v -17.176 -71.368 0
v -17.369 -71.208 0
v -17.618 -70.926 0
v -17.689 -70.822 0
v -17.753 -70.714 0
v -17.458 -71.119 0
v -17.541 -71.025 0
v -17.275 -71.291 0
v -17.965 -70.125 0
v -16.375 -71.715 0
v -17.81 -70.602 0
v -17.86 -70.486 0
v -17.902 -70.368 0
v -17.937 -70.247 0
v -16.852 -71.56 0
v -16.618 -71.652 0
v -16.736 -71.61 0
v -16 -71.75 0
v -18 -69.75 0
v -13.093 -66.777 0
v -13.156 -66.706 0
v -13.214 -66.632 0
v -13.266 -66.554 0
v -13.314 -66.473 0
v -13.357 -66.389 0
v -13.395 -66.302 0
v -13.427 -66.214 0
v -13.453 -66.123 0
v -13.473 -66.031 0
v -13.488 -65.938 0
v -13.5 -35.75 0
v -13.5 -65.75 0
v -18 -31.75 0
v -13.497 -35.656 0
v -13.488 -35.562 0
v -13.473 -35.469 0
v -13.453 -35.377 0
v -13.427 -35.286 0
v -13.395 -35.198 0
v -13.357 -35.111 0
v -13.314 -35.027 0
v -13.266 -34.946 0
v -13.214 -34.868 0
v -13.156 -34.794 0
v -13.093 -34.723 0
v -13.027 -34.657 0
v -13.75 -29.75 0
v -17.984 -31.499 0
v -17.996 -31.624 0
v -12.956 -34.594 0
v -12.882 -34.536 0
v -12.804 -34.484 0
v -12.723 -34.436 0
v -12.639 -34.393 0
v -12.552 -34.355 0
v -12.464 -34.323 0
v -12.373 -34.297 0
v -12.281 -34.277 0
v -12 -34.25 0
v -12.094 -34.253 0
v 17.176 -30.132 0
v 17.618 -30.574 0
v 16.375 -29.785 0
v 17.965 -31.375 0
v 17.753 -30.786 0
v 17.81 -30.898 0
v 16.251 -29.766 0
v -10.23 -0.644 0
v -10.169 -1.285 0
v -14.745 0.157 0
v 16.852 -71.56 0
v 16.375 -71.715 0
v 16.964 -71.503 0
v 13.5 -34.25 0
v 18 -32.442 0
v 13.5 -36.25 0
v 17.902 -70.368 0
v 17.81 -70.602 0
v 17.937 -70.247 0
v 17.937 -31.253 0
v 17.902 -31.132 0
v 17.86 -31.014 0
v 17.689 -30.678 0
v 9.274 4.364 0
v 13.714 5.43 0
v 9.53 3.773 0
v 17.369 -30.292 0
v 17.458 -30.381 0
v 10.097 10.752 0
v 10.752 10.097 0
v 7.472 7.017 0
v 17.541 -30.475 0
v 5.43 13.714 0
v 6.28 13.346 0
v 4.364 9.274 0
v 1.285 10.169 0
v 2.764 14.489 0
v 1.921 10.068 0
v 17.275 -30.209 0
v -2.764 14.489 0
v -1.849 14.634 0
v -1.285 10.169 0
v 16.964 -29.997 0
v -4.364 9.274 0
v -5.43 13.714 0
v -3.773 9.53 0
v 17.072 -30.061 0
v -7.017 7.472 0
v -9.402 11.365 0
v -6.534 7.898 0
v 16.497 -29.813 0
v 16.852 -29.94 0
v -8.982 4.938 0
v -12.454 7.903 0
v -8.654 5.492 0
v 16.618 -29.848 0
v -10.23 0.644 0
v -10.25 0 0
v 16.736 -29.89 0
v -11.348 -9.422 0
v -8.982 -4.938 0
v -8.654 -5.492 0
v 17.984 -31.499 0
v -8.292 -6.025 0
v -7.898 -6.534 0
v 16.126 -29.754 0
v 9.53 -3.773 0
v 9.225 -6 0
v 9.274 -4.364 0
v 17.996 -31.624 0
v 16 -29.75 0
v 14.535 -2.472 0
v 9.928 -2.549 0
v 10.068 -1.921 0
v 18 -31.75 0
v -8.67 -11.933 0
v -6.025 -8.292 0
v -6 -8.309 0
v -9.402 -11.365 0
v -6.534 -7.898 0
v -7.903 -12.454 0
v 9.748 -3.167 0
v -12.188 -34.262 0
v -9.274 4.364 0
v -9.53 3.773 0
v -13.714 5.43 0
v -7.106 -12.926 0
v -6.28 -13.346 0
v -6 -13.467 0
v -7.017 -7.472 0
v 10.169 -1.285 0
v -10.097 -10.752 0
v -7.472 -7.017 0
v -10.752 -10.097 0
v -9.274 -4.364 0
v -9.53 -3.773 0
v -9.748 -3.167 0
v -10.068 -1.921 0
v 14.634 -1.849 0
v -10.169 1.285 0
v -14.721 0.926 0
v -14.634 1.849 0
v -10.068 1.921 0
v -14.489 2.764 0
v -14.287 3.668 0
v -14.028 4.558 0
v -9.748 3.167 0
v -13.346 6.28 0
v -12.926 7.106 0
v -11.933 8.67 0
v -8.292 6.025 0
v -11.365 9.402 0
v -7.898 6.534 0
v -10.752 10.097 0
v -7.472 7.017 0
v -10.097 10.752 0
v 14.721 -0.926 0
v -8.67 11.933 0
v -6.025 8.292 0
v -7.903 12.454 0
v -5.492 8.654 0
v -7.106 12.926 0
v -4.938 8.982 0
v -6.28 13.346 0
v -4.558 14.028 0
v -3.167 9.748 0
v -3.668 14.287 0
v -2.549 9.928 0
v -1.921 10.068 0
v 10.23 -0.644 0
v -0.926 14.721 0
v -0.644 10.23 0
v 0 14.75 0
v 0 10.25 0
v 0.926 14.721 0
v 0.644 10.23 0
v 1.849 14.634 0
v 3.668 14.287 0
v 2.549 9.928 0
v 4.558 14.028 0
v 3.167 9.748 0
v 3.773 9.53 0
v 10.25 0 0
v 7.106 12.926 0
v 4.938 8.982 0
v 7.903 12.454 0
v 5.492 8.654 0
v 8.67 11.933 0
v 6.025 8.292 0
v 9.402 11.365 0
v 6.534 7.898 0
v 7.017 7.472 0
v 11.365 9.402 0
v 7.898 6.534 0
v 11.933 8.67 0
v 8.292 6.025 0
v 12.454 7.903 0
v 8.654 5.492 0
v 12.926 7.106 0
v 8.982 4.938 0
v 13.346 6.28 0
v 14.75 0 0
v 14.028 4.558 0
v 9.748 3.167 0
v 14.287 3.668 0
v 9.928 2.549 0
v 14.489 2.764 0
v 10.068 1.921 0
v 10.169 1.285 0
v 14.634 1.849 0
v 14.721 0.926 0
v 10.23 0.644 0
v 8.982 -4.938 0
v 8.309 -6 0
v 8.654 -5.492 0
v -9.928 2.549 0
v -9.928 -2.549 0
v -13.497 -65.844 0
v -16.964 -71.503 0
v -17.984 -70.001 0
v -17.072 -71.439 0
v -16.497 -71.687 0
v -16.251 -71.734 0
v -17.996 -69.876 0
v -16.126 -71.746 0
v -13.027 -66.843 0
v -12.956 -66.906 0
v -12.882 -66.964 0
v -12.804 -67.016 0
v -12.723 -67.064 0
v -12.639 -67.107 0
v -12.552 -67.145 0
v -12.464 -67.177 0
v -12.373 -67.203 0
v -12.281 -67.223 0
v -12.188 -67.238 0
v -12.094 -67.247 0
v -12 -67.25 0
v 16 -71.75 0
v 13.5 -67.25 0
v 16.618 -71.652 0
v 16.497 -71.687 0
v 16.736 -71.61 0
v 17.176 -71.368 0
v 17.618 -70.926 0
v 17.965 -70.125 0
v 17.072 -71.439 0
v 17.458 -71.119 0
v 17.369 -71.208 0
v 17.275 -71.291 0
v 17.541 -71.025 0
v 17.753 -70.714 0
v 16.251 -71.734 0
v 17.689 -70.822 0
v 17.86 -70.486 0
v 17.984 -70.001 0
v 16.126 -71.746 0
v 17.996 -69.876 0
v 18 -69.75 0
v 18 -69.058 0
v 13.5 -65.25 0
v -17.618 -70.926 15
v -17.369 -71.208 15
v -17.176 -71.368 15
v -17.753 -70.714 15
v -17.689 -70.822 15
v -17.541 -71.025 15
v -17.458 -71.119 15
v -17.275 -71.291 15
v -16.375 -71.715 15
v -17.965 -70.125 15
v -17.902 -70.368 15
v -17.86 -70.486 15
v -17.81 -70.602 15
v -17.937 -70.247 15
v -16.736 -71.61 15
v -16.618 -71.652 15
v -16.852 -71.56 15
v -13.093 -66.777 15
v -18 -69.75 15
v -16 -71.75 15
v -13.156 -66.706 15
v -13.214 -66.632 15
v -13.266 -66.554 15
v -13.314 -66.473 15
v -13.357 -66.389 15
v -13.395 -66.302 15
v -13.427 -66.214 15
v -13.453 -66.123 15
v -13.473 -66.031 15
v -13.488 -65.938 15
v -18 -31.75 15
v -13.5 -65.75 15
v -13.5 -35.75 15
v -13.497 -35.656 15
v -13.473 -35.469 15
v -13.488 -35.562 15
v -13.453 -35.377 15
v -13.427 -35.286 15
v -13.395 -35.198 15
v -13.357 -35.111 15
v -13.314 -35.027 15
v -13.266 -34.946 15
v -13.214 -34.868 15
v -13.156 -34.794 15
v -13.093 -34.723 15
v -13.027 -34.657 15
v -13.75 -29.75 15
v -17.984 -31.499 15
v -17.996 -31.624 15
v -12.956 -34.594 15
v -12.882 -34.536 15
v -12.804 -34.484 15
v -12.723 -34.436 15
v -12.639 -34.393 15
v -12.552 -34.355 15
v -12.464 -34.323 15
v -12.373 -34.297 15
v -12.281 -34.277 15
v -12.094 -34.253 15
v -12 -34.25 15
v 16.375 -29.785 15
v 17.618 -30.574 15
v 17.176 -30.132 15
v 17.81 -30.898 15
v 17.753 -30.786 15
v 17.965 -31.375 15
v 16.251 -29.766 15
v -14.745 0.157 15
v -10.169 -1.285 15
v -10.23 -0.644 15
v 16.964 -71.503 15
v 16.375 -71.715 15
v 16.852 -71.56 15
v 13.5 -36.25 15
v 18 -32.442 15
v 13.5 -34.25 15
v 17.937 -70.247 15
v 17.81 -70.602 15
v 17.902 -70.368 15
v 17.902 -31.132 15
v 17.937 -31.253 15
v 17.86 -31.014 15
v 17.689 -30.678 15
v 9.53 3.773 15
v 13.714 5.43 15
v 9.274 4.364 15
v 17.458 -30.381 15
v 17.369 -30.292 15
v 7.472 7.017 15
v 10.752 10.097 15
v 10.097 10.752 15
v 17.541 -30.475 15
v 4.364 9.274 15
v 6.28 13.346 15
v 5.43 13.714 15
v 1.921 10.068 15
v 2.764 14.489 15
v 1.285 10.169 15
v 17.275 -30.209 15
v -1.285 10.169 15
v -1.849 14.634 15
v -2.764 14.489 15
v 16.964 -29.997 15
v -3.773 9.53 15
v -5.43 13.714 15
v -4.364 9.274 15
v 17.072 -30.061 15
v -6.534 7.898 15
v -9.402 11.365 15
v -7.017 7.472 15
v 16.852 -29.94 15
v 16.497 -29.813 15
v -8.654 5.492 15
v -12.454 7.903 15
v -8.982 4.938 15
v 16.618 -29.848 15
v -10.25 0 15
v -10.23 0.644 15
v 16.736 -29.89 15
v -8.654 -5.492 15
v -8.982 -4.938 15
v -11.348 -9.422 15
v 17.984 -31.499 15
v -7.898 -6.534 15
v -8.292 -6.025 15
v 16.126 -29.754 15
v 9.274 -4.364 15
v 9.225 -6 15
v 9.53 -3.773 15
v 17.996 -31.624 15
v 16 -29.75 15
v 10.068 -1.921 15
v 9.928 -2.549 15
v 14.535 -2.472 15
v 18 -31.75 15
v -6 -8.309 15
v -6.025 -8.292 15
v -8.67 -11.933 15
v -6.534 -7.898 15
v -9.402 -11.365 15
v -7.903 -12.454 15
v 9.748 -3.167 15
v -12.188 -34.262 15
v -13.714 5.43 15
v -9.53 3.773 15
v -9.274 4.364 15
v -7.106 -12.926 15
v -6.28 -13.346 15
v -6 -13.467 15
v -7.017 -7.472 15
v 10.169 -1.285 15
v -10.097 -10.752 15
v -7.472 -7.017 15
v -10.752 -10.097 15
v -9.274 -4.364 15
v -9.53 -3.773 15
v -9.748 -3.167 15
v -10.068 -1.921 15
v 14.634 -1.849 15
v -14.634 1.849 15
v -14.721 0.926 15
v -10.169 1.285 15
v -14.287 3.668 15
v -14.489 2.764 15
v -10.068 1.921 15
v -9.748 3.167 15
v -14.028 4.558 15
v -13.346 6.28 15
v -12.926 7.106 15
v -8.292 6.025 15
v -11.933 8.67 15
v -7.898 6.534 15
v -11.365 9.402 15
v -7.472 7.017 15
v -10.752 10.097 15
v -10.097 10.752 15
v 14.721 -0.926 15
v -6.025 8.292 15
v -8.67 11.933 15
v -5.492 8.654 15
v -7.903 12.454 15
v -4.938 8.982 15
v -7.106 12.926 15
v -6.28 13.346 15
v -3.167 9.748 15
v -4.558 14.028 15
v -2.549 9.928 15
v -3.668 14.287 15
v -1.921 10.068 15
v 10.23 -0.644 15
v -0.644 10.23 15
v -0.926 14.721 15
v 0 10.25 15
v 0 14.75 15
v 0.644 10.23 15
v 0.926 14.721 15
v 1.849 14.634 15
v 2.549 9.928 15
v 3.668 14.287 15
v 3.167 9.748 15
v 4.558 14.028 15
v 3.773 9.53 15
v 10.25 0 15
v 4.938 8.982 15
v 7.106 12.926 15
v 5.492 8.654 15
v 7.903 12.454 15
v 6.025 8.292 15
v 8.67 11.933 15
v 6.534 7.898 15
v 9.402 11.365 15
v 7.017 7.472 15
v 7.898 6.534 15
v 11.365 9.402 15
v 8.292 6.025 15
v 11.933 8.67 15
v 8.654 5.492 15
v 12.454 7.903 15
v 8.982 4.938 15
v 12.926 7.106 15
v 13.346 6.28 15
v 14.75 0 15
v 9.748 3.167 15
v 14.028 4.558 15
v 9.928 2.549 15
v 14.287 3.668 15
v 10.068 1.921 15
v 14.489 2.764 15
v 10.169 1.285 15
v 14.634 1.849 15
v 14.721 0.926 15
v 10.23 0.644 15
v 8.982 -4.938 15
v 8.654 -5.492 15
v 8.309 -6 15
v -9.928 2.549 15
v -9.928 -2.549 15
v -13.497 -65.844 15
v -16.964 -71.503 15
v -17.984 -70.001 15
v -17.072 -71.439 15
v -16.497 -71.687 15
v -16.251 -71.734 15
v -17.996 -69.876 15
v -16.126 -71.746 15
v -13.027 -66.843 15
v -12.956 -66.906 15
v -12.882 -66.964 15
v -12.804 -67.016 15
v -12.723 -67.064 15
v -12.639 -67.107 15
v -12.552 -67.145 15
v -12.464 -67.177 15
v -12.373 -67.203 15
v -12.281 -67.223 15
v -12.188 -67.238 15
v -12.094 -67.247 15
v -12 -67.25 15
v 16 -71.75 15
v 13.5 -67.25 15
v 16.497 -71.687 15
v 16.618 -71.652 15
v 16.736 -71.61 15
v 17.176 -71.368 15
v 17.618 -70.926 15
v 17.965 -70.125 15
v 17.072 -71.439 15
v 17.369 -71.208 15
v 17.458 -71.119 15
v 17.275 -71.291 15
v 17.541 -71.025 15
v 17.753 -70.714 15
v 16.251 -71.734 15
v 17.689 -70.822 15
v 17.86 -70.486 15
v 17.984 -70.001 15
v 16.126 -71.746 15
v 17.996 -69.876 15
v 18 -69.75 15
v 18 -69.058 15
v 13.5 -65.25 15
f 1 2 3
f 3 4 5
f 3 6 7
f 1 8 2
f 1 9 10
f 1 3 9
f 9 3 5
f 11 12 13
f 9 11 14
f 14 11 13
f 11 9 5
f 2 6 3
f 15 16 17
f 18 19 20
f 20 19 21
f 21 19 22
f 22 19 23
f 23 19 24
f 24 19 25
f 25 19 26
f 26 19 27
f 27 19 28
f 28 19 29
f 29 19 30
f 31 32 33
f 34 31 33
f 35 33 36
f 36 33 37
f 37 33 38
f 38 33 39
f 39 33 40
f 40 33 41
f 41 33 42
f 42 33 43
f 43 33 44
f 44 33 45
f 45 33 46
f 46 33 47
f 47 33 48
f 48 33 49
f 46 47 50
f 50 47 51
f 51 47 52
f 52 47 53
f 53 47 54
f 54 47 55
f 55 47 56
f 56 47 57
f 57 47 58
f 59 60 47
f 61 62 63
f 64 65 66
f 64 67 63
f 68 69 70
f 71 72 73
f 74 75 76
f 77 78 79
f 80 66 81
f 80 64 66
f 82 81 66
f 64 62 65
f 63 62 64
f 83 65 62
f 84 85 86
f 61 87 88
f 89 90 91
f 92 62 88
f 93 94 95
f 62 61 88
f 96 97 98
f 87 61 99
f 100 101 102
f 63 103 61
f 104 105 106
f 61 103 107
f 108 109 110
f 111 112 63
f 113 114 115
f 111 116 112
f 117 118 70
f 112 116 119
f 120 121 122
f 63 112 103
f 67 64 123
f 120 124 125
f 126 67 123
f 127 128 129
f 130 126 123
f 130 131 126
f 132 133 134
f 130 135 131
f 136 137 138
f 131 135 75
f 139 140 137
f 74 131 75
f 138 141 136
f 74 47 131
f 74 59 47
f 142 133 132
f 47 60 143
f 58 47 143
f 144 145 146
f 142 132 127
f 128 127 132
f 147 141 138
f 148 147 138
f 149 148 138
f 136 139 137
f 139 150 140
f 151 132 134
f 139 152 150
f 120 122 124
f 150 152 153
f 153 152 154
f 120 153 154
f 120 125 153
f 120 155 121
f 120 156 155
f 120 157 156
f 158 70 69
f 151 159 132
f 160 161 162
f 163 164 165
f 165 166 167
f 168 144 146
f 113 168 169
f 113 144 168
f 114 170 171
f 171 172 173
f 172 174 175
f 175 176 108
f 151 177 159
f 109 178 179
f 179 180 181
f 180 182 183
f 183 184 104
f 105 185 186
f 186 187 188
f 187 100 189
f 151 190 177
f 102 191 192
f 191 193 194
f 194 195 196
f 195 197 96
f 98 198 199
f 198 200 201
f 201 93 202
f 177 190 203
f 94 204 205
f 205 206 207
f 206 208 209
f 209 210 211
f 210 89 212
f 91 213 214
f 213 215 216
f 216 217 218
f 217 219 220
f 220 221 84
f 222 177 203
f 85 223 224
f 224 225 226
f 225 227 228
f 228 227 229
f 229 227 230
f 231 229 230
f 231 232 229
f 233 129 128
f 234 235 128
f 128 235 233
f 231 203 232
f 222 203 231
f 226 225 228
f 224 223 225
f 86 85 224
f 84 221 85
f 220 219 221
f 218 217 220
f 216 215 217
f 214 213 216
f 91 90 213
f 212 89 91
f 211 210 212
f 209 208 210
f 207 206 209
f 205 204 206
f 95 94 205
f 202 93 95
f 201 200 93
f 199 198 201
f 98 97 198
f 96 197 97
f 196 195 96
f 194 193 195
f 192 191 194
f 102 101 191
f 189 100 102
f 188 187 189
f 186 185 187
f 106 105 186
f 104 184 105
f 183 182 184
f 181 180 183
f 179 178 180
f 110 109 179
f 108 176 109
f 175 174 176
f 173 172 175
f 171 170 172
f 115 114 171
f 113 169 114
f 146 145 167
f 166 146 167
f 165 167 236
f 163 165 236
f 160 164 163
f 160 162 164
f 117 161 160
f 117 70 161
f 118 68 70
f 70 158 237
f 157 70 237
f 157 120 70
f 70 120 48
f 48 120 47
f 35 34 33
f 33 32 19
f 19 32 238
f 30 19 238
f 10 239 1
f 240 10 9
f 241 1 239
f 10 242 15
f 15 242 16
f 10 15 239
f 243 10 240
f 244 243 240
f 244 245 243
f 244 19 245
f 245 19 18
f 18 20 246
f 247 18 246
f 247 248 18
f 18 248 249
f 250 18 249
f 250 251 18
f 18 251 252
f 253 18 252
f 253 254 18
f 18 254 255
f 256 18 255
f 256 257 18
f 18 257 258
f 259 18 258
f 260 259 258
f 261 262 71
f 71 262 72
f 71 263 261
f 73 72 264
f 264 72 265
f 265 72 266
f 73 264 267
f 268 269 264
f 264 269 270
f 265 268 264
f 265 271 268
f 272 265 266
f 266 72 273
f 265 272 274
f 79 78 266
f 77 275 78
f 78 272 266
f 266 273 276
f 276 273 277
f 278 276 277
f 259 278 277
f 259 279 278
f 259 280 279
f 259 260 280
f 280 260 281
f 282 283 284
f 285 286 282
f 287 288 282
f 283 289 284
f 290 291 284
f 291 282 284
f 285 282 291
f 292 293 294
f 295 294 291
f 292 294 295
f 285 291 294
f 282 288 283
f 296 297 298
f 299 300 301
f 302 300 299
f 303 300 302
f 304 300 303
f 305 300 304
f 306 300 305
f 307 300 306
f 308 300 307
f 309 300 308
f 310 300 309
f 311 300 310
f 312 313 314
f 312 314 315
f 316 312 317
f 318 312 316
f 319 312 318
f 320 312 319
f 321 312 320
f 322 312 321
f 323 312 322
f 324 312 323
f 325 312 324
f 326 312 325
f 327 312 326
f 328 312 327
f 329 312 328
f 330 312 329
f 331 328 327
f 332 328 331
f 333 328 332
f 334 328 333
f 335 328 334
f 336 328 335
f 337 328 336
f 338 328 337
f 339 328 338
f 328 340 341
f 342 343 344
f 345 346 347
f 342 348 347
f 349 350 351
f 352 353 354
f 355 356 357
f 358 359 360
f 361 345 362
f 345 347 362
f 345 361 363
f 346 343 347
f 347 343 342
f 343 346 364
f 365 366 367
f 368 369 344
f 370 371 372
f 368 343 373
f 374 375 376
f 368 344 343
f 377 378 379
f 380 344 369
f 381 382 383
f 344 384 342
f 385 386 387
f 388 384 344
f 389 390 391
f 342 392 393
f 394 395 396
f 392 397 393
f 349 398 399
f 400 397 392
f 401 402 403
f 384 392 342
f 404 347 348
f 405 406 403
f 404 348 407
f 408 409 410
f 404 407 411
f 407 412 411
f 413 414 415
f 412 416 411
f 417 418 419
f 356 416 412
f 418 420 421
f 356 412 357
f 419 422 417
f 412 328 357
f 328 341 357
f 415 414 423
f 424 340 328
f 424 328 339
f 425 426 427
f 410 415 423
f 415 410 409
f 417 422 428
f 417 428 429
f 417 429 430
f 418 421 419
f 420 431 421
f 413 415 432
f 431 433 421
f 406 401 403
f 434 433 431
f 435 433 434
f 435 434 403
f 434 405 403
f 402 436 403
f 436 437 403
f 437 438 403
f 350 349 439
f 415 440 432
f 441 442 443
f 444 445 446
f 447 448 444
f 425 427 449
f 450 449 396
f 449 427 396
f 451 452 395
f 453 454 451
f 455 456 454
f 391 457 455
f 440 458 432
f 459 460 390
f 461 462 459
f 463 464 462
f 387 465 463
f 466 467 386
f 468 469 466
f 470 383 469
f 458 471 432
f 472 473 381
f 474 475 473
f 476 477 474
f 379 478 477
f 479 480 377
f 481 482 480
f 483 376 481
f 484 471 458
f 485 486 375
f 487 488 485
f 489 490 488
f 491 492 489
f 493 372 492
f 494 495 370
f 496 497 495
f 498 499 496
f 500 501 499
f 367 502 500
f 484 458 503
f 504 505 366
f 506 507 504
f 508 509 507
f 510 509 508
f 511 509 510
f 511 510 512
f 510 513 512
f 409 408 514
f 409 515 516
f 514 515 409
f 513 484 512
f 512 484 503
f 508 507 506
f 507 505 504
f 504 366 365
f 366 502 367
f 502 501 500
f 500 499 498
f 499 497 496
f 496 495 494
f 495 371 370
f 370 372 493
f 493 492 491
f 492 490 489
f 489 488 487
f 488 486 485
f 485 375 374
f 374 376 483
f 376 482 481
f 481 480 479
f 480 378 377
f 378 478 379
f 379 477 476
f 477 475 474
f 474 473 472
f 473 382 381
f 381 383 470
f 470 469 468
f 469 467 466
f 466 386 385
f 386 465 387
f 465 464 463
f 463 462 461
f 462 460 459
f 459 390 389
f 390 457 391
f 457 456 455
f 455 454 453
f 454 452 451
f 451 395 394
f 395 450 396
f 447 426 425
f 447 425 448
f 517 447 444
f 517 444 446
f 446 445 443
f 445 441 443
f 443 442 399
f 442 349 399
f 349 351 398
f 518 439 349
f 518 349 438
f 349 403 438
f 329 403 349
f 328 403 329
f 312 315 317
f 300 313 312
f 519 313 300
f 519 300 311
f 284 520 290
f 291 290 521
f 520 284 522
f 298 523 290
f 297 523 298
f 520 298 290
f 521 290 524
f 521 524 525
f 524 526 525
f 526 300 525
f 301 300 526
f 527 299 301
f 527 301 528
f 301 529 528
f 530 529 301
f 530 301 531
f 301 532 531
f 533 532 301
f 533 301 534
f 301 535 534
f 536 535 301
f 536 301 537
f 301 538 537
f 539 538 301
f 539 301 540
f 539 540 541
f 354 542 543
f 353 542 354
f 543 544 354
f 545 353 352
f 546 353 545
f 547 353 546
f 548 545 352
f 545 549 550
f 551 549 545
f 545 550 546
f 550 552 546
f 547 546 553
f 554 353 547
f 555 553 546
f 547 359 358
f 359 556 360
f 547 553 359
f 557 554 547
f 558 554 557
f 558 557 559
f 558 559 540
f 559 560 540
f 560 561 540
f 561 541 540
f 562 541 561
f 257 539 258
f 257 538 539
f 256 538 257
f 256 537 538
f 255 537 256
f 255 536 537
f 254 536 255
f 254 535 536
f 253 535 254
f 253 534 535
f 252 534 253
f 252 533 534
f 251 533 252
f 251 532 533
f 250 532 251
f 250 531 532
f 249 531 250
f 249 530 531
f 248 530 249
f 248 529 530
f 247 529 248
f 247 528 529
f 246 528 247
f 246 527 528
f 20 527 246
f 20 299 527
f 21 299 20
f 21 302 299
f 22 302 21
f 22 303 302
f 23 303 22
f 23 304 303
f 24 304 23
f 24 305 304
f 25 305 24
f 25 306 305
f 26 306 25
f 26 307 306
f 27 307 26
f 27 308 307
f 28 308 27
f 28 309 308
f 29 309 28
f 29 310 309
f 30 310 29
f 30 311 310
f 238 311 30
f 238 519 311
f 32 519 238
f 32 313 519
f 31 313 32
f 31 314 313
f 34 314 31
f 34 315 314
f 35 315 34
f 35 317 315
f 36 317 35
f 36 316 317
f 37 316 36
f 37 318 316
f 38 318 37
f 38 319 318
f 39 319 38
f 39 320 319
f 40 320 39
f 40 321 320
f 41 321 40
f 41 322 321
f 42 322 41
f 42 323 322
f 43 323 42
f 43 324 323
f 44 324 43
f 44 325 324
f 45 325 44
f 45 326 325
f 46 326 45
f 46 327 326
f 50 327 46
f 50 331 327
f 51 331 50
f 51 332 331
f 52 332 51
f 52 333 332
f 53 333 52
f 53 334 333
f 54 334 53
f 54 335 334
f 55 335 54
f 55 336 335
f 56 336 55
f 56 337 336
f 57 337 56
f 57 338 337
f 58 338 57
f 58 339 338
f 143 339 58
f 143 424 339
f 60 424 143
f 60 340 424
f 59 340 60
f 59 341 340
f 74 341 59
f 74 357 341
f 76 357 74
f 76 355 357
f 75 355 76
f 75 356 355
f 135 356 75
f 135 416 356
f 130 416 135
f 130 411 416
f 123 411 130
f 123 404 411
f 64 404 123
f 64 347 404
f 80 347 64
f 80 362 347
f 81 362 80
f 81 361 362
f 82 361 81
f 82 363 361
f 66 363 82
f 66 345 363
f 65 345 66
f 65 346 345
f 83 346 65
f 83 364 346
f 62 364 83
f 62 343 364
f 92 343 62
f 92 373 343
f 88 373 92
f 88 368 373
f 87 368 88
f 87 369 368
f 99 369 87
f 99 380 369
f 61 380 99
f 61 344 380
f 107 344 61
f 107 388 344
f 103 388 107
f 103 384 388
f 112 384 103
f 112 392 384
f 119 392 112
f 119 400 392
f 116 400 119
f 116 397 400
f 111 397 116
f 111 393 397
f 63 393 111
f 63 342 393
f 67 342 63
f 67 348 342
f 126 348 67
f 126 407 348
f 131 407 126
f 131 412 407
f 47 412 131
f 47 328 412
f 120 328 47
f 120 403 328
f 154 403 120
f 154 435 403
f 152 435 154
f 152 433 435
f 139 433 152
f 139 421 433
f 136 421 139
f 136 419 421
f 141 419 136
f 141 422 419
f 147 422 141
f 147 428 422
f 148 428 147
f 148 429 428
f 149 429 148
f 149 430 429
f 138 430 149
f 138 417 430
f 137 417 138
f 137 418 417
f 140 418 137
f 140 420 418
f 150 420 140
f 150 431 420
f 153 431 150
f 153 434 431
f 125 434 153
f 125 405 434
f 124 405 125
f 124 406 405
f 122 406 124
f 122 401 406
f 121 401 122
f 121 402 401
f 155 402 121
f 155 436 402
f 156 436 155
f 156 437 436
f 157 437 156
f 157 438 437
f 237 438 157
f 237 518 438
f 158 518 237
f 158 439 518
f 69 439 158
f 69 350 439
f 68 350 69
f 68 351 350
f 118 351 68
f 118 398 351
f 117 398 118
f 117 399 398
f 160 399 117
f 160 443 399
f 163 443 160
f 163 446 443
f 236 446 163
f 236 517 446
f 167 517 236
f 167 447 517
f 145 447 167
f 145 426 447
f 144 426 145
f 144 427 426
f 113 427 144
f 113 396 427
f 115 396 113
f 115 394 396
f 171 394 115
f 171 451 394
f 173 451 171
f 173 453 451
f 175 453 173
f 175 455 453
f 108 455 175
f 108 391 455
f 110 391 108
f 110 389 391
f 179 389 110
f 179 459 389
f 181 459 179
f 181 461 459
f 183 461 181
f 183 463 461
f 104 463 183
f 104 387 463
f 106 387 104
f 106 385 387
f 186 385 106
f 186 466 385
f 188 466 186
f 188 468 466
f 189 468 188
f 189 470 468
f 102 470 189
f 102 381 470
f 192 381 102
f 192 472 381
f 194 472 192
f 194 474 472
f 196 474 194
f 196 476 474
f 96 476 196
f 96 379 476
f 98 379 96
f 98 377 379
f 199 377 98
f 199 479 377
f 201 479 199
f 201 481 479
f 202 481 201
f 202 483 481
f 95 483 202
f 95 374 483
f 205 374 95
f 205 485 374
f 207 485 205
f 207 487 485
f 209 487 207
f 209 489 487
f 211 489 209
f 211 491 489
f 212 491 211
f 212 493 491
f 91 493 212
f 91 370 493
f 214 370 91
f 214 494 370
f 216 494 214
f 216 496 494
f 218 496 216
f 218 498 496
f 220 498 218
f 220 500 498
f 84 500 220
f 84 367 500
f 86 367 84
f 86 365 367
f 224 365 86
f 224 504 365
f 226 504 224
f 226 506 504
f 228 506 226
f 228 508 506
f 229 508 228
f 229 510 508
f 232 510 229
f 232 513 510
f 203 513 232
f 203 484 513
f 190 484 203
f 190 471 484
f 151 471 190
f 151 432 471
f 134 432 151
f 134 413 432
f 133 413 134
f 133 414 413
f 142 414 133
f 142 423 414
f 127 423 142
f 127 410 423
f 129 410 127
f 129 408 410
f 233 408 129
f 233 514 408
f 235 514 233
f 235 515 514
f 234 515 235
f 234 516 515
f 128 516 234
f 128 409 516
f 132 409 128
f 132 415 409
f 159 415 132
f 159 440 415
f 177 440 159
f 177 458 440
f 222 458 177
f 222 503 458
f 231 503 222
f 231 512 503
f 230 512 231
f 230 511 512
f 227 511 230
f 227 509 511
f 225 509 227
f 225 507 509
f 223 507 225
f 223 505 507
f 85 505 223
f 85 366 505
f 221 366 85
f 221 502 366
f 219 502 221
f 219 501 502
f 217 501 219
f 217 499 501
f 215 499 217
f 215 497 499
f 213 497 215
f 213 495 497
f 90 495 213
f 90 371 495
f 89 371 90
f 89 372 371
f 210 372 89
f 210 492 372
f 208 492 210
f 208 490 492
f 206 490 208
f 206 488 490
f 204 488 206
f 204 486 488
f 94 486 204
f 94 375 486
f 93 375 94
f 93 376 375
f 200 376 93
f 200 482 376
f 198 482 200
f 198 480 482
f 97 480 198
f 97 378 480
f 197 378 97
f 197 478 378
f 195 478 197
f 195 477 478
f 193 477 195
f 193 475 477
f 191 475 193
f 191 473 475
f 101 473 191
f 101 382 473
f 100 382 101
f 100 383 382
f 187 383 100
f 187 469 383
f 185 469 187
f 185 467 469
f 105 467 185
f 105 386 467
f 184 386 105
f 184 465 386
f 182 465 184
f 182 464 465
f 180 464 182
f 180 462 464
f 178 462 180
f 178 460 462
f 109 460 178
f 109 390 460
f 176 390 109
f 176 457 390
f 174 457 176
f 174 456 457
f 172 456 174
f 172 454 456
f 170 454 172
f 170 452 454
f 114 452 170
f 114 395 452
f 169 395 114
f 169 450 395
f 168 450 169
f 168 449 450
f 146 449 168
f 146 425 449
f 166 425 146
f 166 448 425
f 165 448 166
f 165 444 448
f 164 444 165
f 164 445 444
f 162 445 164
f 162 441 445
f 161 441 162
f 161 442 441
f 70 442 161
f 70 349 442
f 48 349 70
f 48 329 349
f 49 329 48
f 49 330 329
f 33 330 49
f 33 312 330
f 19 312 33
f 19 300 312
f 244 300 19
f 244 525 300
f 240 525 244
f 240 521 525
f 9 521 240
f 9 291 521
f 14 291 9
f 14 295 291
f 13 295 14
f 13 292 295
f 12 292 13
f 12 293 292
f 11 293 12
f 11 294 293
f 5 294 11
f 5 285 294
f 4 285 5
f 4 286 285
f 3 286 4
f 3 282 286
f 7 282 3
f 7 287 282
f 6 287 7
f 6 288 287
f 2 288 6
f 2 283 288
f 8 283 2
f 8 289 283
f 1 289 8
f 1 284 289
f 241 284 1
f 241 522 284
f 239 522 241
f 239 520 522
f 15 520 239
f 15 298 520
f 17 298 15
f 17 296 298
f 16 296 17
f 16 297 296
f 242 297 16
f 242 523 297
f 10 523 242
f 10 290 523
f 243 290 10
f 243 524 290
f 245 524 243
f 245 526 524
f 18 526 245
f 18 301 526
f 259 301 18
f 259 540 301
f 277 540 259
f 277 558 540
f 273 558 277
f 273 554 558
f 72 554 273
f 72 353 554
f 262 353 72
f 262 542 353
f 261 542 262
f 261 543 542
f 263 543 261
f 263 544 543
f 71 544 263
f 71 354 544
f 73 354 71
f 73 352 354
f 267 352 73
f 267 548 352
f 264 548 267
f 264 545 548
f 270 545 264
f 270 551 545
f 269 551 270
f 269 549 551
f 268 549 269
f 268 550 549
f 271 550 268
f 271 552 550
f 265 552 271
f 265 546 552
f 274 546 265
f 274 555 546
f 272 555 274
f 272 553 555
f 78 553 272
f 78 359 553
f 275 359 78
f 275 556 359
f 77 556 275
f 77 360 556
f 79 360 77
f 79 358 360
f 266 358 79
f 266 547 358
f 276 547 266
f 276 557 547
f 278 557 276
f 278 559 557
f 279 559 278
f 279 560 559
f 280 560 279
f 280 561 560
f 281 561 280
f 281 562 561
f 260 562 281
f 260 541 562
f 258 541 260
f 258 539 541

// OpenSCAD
/* 
    電源タップ用フック (Power Tap Hook)
    直径20mmの丸パイプに、電源タップ（W32 x H26）を引っ掛けてぶら下げるためのパーツ。
    
    パイプ径: 20mm
    電源タップ: 32mm x 26mmを変形（コンセントを横から差すため、26mm x 32mmの縦置きレイアウトでモデリング）
    （本パーツを2つほどプリントし、タップをスライドさせて通すことで安定して保持可能です。左右どちら向きにも挿入できます）
*/

// --- 設定 ---
$fn = 100;

// --- パラメータ ---
pipe_dia = 20;   // パイプ径
// コンセントを上面ではなく横方向から差せるようにするため、幅と高さを入れ替えて縦置き保持にします
tap_w = 26;      // 電源タップの幅 (元H)
tap_h = 32;      // 電源タップの高さ (元W)

wall_thickness = 4.5; // 壁の厚み（強度確保のため厚めの4.5mm）
extrusion_width = 15; // フック自体の幅（押し出し量）

clearance_pipe = 0.5; // パイプがスナップフィットするためのクリアランス
clearance_tap = 1.0;  // タップがスムーズに通るためのクリアランス

drop_distance = 15;   // パイプとタップホルダーの間の距離（大きなACアダプタ類がパイプと干渉しないよう余裕を持たせました）

// --- 計算値 ---
pr = pipe_dia/2 + clearance_pipe/2; // パイプ内径 (約10.25)
PR = pr + wall_thickness;           // パイプ外径 (約14.75)

tw = tap_w + clearance_tap;         // タップホルダーの内側幅 (33)
th = tap_h + clearance_tap;         // タップホルダーの内側高さ (27)

// 角を丸めた四角形を生成するヘルパーモジュール
module rounded_square(size, r=2) {
    translate([r, r])
        offset(r=r)
            square([size[0] - 2*r, size[1] - 2*r]);
}

// --- メインモジュール ---
module power_tap_hook() {
    linear_extrude(height = extrusion_width, convexity=4) {
        difference() {
            // 1. ベースとなる基本形状
            union() {
                // パイプフック外形
                circle(r = PR);
                
                // 左側のアーム（パイプとタップホルダーを接続）
                // hull関数を用いて美しい滑らかな接続を作成
                hull() {
                    // パイプ側アンカー
                    translate([-PR + wall_thickness/2, 0])
                        circle(r = wall_thickness/2);
                        
                    // タップホルダー側アンカー (左上角のR2丸みにぴったり合わせる)
                    translate([-(tw/2 + wall_thickness) + 2, -PR - drop_distance - 2])
                        circle(r = 2);
                }
                
                // タップホルダー外形 (角を丸めて手触りと見た目を向上)
                translate([-(tw/2 + wall_thickness), -PR - drop_distance - th - 2*wall_thickness])
                    rounded_square([tw + 2*wall_thickness, th + 2*wall_thickness], r=2);
            }
            
            // 2. くり抜き処理
            
            // パイプを通す穴
            circle(r = pr);
            
            // 電源タップを通すホルダー穴（左側内角は丸めて応力集中を防ぐ）
            translate([-tw/2, -PR - drop_distance - th - wall_thickness])
                rounded_square([tw, th], r=1.5);
                
            // ★ツメ（返し）部分のホールド力を最大限確保するため、右半分の内角は丸めずに直角にくり抜く
            translate([0, -PR - drop_distance - th - wall_thickness])
                square([tw/2, th]);
                
            // ★右側開放部にスナップフィット用の「返し（フック）」を形成する
            // 外側は広いスロープになっており、タップを押し込むとアームが開きます
            // タップが入った後は上下2mmの「返し」が引っかかり抜け止めとしてしっかりホールドします
            translate([tw/2, -PR - drop_distance - th - wall_thickness])
                polygon([
                    [0, 2],                                        // 右下フックの「返し」高さ（内側へ2mm残す）
                    [wall_thickness + 2, -wall_thickness + 1],     // 下ガイドスロープ（外側はタップより広く開く）
                    [wall_thickness + 2, th + wall_thickness - 1], // 上ガイドスロープ（外側はタップより広く開く）
                    [0, th - 2]                                    // 右上フックの「返し」高さ（内側へ2mm残す）
                ]);
                
            // パイプへスナップ固定するための下部開口
            // X=-6で左側のツメ、Y=-6で右側のツメを形成。約14.6mmの開口により、20mmパイプへ「パチン」とはめ込み可能。
            translate([-6, -PR - 5])
                square([PR + 15, PR + 5 - 6]);
                
            // 右側のツメ先端への面取り加工 (挿入時のガイドとなるスロープ)
            polygon([
                [pr*0.9, -6],   // X=8.3から少し余裕を持たせ、約1mmの平らなツメを残す
                [PR + 2, -6],
                [PR + 2, -1]    // 挿入時にパイプが滑りやすくするスロープ
            ]);
        }
    }
}

// レンダリング実行
power_tap_hook();
